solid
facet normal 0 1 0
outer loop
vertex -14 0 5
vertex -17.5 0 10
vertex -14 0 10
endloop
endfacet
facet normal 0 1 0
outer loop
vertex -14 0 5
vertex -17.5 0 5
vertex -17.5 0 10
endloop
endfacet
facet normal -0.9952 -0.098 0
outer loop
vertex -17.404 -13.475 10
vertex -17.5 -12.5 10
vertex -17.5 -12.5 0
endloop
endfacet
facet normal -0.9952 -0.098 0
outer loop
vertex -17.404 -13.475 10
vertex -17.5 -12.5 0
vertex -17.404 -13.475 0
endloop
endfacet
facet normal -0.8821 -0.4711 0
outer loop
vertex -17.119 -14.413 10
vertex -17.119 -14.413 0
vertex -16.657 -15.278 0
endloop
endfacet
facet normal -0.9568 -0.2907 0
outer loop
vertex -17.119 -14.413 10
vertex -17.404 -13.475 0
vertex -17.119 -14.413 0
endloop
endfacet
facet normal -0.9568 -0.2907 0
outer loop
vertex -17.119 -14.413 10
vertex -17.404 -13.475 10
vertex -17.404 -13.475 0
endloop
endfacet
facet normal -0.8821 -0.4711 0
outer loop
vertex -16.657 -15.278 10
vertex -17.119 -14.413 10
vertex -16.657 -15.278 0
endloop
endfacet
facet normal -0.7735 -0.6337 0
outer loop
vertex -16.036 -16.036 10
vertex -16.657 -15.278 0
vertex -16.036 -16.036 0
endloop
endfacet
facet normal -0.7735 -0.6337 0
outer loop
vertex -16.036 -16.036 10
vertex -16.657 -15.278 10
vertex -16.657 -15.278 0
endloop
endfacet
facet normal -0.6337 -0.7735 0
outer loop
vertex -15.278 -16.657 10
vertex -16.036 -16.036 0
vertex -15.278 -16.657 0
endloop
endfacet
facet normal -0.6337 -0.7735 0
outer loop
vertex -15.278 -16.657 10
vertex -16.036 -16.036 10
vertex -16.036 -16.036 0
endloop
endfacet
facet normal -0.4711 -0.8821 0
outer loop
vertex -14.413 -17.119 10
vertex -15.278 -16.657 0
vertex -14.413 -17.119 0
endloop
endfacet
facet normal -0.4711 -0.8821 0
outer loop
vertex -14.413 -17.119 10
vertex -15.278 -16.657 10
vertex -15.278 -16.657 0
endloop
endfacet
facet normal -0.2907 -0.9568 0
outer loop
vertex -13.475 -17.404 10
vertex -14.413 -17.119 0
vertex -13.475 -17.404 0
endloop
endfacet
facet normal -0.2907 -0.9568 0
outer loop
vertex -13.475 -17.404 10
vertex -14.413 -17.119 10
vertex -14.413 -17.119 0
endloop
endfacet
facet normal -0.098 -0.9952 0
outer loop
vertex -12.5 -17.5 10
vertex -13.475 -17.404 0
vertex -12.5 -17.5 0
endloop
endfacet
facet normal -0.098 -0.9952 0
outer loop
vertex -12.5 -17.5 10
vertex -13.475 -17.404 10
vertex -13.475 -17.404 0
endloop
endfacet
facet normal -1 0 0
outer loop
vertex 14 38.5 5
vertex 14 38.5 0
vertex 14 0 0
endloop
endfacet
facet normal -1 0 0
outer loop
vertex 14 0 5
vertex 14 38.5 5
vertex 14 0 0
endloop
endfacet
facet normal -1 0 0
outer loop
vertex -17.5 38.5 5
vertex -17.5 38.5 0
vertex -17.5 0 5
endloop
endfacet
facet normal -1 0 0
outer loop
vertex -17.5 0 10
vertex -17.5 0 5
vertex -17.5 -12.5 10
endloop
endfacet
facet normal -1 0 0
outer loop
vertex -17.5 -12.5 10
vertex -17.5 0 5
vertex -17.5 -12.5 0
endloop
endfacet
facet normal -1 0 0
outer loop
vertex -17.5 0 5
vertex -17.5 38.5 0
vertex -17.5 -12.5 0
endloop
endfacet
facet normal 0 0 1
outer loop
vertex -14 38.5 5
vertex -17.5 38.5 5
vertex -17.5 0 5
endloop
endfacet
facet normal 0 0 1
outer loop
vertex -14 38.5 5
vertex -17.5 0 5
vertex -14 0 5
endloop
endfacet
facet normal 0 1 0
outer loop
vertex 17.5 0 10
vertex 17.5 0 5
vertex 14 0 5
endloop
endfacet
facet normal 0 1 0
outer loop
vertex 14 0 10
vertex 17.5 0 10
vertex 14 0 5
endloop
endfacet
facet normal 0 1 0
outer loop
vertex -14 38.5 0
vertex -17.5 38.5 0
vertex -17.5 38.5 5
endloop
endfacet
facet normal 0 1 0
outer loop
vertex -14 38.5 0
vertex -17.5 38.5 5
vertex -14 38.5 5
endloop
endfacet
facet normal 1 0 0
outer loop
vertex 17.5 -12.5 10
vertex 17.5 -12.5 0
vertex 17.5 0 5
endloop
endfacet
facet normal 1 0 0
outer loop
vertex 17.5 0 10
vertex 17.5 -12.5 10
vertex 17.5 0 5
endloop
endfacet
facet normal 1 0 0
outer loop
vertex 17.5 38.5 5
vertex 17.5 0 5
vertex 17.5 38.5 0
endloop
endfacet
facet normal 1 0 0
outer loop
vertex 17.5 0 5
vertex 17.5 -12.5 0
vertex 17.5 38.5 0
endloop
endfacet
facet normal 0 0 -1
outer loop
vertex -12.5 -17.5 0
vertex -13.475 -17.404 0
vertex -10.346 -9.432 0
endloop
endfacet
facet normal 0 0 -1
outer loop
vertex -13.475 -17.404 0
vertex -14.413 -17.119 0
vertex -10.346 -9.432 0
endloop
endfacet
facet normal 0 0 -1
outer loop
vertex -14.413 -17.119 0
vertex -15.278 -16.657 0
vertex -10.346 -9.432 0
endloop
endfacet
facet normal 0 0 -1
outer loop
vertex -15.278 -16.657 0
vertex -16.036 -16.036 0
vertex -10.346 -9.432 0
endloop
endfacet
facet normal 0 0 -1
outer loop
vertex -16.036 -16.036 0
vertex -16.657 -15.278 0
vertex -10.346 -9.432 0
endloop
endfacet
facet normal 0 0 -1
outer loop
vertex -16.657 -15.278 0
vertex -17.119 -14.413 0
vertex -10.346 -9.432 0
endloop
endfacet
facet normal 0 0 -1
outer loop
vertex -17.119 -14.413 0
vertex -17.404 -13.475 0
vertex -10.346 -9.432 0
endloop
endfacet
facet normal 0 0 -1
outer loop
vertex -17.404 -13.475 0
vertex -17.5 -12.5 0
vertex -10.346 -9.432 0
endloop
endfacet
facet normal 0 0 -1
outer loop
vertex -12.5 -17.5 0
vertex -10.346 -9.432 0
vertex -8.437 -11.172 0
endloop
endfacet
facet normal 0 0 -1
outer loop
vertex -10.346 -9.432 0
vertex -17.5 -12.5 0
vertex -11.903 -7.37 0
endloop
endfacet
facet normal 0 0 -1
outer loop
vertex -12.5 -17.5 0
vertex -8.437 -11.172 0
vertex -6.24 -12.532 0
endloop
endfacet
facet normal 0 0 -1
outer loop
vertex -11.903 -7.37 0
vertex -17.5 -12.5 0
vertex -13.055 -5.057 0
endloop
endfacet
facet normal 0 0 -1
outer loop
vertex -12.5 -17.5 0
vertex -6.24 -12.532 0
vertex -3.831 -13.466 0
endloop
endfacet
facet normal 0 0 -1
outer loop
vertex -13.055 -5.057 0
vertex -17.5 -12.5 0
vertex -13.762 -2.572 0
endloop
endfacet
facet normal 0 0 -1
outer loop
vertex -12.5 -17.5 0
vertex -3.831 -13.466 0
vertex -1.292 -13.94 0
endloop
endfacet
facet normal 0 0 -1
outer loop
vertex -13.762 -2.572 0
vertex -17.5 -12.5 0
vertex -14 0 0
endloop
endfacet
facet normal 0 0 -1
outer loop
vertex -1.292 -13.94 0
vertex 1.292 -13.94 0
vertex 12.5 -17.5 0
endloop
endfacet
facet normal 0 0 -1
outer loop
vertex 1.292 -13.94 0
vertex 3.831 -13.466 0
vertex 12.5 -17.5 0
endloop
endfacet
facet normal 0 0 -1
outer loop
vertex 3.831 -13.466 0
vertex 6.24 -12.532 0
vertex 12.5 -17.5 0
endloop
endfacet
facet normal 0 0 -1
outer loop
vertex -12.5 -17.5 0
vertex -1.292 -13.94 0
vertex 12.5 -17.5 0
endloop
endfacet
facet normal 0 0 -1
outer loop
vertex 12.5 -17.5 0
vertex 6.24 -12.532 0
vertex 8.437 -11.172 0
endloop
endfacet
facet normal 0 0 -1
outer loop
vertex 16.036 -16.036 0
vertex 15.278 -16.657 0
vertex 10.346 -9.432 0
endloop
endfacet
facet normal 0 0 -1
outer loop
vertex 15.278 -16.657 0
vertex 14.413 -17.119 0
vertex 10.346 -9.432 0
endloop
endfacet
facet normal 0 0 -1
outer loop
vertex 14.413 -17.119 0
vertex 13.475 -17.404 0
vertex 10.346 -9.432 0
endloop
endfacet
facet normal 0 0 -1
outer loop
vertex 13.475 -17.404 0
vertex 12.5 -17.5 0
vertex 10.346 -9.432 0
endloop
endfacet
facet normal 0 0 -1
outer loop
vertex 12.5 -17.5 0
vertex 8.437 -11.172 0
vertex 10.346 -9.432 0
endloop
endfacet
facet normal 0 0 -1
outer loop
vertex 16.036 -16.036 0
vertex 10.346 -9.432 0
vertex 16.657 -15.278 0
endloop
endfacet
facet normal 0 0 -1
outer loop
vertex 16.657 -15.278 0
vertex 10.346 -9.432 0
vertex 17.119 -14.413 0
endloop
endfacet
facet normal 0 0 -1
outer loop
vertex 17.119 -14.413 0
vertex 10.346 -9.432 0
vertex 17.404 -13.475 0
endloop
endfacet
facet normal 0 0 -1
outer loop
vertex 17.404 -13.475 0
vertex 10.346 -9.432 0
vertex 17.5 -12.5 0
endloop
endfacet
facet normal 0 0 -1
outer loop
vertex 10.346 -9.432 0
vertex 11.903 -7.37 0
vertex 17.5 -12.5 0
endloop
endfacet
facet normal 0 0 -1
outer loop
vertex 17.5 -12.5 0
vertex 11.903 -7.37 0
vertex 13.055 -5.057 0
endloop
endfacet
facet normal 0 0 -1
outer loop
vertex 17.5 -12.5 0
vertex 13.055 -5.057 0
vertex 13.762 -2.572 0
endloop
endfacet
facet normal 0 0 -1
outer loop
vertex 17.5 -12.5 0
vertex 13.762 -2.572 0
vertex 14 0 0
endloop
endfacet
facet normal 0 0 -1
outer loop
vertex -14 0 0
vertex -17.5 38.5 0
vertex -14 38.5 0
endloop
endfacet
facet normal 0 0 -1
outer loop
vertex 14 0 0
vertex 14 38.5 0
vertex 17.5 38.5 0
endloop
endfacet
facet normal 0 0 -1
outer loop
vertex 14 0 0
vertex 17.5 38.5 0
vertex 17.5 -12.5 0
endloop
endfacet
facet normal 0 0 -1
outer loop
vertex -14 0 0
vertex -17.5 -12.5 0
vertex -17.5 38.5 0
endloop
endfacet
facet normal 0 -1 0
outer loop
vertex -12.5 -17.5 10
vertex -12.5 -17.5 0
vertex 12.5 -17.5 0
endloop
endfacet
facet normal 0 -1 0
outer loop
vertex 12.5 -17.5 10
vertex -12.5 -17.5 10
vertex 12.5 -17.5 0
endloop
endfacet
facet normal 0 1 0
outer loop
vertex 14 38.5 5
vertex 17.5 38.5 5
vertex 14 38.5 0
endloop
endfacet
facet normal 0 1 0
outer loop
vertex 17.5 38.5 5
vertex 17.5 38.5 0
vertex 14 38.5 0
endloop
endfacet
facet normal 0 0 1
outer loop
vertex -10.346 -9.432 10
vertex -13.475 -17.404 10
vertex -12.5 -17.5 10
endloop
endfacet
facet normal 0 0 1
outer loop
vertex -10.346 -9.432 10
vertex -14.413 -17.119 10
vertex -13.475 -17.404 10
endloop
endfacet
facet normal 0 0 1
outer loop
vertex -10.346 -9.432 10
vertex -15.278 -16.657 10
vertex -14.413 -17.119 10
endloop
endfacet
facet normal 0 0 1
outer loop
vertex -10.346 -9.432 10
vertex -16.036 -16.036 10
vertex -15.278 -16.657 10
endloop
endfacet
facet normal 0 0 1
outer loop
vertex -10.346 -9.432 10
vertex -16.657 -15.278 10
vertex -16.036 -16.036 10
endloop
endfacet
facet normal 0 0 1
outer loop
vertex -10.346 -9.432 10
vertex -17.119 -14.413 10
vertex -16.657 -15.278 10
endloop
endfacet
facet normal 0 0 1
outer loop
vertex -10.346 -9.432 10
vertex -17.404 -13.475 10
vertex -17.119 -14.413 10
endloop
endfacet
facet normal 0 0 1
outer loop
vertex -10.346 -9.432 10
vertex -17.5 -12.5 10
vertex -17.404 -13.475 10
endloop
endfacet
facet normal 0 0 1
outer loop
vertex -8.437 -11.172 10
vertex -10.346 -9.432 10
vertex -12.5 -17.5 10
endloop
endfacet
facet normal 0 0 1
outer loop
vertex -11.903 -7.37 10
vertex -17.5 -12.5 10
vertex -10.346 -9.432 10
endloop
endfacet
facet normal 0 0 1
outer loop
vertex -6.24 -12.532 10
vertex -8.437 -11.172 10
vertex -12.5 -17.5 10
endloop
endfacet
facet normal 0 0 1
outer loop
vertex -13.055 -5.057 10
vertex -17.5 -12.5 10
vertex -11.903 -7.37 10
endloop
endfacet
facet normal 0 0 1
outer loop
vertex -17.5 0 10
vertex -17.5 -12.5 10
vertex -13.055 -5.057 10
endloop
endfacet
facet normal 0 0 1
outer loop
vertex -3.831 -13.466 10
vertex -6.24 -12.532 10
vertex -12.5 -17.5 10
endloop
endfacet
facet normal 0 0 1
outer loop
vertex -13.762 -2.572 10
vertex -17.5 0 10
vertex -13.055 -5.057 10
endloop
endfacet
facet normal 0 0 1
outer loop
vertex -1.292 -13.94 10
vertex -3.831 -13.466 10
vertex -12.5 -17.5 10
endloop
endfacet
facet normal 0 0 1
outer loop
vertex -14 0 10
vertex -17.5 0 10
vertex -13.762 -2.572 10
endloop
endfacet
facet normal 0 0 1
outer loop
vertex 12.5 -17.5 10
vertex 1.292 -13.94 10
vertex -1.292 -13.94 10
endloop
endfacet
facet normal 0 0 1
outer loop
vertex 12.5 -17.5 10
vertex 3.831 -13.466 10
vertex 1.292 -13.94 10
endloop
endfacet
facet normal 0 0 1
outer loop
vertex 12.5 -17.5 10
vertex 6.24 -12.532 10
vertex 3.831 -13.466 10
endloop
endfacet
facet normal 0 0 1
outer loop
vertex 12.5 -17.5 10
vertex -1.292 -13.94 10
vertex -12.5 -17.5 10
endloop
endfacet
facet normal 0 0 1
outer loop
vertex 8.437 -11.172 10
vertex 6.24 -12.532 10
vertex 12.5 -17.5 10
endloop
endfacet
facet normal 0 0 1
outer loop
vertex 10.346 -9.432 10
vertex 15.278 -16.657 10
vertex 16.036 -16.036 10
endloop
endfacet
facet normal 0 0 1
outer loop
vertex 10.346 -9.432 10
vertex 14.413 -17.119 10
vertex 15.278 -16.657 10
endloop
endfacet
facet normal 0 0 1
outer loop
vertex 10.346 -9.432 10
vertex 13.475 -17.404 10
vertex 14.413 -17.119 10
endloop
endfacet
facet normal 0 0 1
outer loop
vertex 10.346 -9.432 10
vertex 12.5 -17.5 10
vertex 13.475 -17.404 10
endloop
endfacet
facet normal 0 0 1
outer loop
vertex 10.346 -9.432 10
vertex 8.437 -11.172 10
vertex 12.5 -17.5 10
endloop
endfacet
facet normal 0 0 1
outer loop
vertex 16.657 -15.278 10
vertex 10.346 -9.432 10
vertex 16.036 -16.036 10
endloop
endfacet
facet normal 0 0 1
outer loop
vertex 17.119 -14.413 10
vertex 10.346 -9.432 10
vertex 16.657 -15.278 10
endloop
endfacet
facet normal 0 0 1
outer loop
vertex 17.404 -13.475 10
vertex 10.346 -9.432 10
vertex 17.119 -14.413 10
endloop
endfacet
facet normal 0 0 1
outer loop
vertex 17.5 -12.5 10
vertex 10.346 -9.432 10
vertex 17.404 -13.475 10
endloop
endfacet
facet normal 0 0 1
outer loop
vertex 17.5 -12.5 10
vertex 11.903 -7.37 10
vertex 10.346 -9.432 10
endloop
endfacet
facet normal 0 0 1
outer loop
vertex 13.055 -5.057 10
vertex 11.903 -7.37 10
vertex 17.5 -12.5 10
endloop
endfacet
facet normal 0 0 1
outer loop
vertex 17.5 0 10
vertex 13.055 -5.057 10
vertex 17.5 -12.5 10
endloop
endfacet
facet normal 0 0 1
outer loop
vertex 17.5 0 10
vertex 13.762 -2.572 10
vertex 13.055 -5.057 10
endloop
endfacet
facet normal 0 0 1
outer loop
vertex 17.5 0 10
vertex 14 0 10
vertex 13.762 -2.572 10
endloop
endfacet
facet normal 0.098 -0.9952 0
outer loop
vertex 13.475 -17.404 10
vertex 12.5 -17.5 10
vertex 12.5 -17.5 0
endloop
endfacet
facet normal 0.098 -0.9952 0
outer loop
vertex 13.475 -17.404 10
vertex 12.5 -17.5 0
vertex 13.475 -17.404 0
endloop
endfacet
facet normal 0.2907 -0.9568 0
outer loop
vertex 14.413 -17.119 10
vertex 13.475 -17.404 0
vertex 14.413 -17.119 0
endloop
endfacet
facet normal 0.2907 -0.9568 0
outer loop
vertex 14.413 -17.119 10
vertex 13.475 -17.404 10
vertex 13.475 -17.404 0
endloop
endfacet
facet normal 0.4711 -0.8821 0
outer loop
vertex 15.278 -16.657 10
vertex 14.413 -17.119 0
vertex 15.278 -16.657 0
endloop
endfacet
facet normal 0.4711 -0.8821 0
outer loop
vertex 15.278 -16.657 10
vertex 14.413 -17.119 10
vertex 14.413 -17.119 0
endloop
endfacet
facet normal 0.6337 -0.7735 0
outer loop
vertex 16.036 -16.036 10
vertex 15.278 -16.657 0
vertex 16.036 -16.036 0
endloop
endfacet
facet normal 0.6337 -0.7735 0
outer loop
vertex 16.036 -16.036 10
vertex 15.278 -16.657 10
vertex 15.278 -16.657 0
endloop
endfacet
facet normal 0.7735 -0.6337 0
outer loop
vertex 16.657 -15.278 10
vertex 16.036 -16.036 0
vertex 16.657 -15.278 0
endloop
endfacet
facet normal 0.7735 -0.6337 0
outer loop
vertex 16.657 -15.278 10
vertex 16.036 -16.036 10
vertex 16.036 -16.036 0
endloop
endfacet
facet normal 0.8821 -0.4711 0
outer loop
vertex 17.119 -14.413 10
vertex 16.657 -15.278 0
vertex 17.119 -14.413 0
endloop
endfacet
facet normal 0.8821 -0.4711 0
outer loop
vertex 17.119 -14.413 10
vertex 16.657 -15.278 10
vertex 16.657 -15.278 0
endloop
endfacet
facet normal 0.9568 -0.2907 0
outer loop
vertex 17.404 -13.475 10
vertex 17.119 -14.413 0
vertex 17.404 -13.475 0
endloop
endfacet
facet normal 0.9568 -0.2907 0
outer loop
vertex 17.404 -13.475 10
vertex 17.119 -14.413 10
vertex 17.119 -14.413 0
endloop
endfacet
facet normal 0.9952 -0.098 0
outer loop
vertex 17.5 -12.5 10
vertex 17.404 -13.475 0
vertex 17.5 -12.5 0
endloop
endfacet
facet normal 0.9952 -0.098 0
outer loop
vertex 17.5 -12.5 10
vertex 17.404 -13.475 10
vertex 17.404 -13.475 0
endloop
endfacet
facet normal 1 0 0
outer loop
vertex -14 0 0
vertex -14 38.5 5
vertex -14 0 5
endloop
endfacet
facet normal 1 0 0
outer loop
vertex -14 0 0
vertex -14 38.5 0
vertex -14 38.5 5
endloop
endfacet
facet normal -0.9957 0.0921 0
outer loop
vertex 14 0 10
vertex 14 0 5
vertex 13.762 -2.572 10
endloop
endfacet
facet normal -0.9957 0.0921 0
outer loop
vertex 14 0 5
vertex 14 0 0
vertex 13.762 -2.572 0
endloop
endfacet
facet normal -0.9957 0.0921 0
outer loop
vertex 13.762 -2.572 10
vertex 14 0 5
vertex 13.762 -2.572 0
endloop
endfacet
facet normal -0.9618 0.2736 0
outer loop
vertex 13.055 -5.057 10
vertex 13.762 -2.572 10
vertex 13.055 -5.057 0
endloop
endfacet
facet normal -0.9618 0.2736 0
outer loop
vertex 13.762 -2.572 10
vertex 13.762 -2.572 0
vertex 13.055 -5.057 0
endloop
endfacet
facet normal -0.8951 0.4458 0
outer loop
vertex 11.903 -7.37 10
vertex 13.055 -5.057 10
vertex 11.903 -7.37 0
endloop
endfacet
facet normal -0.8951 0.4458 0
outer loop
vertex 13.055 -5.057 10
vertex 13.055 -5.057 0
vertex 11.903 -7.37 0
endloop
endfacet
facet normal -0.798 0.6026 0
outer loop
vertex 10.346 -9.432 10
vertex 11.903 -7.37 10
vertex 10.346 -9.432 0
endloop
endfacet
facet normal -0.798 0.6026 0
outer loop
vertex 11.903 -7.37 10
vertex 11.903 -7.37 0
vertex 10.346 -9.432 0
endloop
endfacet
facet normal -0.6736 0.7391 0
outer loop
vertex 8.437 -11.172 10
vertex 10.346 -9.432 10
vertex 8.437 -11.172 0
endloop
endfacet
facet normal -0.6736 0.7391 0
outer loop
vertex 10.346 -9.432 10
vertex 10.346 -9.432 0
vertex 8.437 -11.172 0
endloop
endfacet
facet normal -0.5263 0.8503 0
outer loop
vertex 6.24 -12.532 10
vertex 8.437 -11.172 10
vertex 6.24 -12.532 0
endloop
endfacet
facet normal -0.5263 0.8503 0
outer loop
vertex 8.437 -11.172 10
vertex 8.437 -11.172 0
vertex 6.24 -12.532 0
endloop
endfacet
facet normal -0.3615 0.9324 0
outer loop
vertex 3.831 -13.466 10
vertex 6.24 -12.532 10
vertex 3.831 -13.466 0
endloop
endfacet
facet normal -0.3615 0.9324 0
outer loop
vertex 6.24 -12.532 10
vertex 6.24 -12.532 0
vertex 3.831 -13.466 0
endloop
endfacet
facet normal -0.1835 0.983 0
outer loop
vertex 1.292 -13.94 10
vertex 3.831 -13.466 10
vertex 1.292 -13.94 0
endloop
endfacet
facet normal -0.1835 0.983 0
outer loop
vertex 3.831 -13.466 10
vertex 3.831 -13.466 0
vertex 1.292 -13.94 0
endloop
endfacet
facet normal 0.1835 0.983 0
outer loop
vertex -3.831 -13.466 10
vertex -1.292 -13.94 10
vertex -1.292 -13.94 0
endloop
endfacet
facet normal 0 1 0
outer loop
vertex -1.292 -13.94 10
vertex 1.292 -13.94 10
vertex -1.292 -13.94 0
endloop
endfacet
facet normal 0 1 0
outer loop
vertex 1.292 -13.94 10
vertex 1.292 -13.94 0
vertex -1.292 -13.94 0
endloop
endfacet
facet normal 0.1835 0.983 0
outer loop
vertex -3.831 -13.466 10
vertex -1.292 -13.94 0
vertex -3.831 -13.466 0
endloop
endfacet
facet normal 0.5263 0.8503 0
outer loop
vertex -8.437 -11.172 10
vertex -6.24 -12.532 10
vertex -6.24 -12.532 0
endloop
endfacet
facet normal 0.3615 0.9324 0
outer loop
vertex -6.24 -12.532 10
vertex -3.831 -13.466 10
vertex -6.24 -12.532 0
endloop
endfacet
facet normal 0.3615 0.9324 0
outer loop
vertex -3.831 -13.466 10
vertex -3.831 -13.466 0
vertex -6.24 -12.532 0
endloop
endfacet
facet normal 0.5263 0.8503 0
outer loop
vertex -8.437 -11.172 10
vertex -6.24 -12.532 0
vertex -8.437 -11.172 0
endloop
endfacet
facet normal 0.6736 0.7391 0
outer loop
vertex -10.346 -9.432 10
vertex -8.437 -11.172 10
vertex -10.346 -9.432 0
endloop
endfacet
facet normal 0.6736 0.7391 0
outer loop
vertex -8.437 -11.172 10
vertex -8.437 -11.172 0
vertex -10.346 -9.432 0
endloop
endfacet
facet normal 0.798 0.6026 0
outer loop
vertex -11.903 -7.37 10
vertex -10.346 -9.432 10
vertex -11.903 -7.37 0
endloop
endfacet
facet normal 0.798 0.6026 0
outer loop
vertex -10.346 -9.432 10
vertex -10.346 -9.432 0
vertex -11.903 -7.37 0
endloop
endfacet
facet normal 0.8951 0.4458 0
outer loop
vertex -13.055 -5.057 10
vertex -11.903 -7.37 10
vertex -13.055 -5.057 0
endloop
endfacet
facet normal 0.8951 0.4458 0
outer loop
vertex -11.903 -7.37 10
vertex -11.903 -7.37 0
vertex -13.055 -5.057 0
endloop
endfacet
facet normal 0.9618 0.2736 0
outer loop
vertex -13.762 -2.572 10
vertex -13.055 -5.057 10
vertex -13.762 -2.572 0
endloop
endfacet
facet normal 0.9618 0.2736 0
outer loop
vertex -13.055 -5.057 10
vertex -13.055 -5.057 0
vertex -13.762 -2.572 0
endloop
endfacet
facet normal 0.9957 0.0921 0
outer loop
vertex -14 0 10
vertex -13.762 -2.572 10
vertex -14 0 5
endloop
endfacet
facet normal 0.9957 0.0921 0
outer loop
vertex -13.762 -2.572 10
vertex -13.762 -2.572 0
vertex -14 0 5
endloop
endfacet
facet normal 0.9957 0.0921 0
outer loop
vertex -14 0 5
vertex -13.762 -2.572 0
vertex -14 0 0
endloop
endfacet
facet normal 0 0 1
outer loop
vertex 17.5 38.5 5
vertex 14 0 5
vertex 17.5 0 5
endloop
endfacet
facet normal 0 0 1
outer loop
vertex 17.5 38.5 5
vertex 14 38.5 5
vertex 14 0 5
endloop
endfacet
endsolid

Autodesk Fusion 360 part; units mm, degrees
sketch "Sketch1" plane through (0, 0, 0) normal (0, 0, 1) x (1, 0, 0)
  circle A0 centre (0, 0) radius 14
  line L0 (14, 0) -> (-14, 0)
  line L1 (-17.5, 0) -> (-17.5, -17.5)
  line L2 (-17.5, -17.5) -> (17.5, -17.5)
  line L3 (17.5, -17.5) -> (17.5, 0)
  line L4 (-17.5, 0) -> (-17.5, 38.5)
  line L5 (17.5, 0) -> (17.5, 38.5)
  line L6 (-17.5, 0) -> (-17.5, 38.5)
  line L7 (-17.5, 38.5) -> (-14, 38.5)
  line L8 (-14, 38.5) -> (-14, 0)
  line L9 (17.5, 0) -> (17.5, 38.5)
  line L10 (17.5, 38.5) -> (14, 38.5)
  line L11 (14, 38.5) -> (14, 0)
  line L12 (-14, 38.5) -> (14, 38.5)
  arc A1 (-17.5, 0.003) -> (-17.5, -0.003) centre (0, 0) ccw
  line L13 (-17.5, 0) -> (-14, 0)
  line L14 (17.5, 0) -> (14, 0)
  dimension "d1" = 28
  dimension "d2" = 35
  dimension "d3" = 35
  dimension "d4" = 17.5
  dimension "d5" = 38.5
  dimension "d6" = 38.5
extrude "Extrude1" add sketch "Sketch1" along normal blind 10 contours A0 L1 L2 L3 A1 L13 L14
extrude "Extrude2" add sketch "Sketch1" along normal blind 5 contours L5 L9 L10 L11 L14 | L4 L6 L7 L8 A1 L13
fillet "Fillet1" radius 5 2 edges at (-17.5, -17.5, 5) (17.5, -17.5, 5)
